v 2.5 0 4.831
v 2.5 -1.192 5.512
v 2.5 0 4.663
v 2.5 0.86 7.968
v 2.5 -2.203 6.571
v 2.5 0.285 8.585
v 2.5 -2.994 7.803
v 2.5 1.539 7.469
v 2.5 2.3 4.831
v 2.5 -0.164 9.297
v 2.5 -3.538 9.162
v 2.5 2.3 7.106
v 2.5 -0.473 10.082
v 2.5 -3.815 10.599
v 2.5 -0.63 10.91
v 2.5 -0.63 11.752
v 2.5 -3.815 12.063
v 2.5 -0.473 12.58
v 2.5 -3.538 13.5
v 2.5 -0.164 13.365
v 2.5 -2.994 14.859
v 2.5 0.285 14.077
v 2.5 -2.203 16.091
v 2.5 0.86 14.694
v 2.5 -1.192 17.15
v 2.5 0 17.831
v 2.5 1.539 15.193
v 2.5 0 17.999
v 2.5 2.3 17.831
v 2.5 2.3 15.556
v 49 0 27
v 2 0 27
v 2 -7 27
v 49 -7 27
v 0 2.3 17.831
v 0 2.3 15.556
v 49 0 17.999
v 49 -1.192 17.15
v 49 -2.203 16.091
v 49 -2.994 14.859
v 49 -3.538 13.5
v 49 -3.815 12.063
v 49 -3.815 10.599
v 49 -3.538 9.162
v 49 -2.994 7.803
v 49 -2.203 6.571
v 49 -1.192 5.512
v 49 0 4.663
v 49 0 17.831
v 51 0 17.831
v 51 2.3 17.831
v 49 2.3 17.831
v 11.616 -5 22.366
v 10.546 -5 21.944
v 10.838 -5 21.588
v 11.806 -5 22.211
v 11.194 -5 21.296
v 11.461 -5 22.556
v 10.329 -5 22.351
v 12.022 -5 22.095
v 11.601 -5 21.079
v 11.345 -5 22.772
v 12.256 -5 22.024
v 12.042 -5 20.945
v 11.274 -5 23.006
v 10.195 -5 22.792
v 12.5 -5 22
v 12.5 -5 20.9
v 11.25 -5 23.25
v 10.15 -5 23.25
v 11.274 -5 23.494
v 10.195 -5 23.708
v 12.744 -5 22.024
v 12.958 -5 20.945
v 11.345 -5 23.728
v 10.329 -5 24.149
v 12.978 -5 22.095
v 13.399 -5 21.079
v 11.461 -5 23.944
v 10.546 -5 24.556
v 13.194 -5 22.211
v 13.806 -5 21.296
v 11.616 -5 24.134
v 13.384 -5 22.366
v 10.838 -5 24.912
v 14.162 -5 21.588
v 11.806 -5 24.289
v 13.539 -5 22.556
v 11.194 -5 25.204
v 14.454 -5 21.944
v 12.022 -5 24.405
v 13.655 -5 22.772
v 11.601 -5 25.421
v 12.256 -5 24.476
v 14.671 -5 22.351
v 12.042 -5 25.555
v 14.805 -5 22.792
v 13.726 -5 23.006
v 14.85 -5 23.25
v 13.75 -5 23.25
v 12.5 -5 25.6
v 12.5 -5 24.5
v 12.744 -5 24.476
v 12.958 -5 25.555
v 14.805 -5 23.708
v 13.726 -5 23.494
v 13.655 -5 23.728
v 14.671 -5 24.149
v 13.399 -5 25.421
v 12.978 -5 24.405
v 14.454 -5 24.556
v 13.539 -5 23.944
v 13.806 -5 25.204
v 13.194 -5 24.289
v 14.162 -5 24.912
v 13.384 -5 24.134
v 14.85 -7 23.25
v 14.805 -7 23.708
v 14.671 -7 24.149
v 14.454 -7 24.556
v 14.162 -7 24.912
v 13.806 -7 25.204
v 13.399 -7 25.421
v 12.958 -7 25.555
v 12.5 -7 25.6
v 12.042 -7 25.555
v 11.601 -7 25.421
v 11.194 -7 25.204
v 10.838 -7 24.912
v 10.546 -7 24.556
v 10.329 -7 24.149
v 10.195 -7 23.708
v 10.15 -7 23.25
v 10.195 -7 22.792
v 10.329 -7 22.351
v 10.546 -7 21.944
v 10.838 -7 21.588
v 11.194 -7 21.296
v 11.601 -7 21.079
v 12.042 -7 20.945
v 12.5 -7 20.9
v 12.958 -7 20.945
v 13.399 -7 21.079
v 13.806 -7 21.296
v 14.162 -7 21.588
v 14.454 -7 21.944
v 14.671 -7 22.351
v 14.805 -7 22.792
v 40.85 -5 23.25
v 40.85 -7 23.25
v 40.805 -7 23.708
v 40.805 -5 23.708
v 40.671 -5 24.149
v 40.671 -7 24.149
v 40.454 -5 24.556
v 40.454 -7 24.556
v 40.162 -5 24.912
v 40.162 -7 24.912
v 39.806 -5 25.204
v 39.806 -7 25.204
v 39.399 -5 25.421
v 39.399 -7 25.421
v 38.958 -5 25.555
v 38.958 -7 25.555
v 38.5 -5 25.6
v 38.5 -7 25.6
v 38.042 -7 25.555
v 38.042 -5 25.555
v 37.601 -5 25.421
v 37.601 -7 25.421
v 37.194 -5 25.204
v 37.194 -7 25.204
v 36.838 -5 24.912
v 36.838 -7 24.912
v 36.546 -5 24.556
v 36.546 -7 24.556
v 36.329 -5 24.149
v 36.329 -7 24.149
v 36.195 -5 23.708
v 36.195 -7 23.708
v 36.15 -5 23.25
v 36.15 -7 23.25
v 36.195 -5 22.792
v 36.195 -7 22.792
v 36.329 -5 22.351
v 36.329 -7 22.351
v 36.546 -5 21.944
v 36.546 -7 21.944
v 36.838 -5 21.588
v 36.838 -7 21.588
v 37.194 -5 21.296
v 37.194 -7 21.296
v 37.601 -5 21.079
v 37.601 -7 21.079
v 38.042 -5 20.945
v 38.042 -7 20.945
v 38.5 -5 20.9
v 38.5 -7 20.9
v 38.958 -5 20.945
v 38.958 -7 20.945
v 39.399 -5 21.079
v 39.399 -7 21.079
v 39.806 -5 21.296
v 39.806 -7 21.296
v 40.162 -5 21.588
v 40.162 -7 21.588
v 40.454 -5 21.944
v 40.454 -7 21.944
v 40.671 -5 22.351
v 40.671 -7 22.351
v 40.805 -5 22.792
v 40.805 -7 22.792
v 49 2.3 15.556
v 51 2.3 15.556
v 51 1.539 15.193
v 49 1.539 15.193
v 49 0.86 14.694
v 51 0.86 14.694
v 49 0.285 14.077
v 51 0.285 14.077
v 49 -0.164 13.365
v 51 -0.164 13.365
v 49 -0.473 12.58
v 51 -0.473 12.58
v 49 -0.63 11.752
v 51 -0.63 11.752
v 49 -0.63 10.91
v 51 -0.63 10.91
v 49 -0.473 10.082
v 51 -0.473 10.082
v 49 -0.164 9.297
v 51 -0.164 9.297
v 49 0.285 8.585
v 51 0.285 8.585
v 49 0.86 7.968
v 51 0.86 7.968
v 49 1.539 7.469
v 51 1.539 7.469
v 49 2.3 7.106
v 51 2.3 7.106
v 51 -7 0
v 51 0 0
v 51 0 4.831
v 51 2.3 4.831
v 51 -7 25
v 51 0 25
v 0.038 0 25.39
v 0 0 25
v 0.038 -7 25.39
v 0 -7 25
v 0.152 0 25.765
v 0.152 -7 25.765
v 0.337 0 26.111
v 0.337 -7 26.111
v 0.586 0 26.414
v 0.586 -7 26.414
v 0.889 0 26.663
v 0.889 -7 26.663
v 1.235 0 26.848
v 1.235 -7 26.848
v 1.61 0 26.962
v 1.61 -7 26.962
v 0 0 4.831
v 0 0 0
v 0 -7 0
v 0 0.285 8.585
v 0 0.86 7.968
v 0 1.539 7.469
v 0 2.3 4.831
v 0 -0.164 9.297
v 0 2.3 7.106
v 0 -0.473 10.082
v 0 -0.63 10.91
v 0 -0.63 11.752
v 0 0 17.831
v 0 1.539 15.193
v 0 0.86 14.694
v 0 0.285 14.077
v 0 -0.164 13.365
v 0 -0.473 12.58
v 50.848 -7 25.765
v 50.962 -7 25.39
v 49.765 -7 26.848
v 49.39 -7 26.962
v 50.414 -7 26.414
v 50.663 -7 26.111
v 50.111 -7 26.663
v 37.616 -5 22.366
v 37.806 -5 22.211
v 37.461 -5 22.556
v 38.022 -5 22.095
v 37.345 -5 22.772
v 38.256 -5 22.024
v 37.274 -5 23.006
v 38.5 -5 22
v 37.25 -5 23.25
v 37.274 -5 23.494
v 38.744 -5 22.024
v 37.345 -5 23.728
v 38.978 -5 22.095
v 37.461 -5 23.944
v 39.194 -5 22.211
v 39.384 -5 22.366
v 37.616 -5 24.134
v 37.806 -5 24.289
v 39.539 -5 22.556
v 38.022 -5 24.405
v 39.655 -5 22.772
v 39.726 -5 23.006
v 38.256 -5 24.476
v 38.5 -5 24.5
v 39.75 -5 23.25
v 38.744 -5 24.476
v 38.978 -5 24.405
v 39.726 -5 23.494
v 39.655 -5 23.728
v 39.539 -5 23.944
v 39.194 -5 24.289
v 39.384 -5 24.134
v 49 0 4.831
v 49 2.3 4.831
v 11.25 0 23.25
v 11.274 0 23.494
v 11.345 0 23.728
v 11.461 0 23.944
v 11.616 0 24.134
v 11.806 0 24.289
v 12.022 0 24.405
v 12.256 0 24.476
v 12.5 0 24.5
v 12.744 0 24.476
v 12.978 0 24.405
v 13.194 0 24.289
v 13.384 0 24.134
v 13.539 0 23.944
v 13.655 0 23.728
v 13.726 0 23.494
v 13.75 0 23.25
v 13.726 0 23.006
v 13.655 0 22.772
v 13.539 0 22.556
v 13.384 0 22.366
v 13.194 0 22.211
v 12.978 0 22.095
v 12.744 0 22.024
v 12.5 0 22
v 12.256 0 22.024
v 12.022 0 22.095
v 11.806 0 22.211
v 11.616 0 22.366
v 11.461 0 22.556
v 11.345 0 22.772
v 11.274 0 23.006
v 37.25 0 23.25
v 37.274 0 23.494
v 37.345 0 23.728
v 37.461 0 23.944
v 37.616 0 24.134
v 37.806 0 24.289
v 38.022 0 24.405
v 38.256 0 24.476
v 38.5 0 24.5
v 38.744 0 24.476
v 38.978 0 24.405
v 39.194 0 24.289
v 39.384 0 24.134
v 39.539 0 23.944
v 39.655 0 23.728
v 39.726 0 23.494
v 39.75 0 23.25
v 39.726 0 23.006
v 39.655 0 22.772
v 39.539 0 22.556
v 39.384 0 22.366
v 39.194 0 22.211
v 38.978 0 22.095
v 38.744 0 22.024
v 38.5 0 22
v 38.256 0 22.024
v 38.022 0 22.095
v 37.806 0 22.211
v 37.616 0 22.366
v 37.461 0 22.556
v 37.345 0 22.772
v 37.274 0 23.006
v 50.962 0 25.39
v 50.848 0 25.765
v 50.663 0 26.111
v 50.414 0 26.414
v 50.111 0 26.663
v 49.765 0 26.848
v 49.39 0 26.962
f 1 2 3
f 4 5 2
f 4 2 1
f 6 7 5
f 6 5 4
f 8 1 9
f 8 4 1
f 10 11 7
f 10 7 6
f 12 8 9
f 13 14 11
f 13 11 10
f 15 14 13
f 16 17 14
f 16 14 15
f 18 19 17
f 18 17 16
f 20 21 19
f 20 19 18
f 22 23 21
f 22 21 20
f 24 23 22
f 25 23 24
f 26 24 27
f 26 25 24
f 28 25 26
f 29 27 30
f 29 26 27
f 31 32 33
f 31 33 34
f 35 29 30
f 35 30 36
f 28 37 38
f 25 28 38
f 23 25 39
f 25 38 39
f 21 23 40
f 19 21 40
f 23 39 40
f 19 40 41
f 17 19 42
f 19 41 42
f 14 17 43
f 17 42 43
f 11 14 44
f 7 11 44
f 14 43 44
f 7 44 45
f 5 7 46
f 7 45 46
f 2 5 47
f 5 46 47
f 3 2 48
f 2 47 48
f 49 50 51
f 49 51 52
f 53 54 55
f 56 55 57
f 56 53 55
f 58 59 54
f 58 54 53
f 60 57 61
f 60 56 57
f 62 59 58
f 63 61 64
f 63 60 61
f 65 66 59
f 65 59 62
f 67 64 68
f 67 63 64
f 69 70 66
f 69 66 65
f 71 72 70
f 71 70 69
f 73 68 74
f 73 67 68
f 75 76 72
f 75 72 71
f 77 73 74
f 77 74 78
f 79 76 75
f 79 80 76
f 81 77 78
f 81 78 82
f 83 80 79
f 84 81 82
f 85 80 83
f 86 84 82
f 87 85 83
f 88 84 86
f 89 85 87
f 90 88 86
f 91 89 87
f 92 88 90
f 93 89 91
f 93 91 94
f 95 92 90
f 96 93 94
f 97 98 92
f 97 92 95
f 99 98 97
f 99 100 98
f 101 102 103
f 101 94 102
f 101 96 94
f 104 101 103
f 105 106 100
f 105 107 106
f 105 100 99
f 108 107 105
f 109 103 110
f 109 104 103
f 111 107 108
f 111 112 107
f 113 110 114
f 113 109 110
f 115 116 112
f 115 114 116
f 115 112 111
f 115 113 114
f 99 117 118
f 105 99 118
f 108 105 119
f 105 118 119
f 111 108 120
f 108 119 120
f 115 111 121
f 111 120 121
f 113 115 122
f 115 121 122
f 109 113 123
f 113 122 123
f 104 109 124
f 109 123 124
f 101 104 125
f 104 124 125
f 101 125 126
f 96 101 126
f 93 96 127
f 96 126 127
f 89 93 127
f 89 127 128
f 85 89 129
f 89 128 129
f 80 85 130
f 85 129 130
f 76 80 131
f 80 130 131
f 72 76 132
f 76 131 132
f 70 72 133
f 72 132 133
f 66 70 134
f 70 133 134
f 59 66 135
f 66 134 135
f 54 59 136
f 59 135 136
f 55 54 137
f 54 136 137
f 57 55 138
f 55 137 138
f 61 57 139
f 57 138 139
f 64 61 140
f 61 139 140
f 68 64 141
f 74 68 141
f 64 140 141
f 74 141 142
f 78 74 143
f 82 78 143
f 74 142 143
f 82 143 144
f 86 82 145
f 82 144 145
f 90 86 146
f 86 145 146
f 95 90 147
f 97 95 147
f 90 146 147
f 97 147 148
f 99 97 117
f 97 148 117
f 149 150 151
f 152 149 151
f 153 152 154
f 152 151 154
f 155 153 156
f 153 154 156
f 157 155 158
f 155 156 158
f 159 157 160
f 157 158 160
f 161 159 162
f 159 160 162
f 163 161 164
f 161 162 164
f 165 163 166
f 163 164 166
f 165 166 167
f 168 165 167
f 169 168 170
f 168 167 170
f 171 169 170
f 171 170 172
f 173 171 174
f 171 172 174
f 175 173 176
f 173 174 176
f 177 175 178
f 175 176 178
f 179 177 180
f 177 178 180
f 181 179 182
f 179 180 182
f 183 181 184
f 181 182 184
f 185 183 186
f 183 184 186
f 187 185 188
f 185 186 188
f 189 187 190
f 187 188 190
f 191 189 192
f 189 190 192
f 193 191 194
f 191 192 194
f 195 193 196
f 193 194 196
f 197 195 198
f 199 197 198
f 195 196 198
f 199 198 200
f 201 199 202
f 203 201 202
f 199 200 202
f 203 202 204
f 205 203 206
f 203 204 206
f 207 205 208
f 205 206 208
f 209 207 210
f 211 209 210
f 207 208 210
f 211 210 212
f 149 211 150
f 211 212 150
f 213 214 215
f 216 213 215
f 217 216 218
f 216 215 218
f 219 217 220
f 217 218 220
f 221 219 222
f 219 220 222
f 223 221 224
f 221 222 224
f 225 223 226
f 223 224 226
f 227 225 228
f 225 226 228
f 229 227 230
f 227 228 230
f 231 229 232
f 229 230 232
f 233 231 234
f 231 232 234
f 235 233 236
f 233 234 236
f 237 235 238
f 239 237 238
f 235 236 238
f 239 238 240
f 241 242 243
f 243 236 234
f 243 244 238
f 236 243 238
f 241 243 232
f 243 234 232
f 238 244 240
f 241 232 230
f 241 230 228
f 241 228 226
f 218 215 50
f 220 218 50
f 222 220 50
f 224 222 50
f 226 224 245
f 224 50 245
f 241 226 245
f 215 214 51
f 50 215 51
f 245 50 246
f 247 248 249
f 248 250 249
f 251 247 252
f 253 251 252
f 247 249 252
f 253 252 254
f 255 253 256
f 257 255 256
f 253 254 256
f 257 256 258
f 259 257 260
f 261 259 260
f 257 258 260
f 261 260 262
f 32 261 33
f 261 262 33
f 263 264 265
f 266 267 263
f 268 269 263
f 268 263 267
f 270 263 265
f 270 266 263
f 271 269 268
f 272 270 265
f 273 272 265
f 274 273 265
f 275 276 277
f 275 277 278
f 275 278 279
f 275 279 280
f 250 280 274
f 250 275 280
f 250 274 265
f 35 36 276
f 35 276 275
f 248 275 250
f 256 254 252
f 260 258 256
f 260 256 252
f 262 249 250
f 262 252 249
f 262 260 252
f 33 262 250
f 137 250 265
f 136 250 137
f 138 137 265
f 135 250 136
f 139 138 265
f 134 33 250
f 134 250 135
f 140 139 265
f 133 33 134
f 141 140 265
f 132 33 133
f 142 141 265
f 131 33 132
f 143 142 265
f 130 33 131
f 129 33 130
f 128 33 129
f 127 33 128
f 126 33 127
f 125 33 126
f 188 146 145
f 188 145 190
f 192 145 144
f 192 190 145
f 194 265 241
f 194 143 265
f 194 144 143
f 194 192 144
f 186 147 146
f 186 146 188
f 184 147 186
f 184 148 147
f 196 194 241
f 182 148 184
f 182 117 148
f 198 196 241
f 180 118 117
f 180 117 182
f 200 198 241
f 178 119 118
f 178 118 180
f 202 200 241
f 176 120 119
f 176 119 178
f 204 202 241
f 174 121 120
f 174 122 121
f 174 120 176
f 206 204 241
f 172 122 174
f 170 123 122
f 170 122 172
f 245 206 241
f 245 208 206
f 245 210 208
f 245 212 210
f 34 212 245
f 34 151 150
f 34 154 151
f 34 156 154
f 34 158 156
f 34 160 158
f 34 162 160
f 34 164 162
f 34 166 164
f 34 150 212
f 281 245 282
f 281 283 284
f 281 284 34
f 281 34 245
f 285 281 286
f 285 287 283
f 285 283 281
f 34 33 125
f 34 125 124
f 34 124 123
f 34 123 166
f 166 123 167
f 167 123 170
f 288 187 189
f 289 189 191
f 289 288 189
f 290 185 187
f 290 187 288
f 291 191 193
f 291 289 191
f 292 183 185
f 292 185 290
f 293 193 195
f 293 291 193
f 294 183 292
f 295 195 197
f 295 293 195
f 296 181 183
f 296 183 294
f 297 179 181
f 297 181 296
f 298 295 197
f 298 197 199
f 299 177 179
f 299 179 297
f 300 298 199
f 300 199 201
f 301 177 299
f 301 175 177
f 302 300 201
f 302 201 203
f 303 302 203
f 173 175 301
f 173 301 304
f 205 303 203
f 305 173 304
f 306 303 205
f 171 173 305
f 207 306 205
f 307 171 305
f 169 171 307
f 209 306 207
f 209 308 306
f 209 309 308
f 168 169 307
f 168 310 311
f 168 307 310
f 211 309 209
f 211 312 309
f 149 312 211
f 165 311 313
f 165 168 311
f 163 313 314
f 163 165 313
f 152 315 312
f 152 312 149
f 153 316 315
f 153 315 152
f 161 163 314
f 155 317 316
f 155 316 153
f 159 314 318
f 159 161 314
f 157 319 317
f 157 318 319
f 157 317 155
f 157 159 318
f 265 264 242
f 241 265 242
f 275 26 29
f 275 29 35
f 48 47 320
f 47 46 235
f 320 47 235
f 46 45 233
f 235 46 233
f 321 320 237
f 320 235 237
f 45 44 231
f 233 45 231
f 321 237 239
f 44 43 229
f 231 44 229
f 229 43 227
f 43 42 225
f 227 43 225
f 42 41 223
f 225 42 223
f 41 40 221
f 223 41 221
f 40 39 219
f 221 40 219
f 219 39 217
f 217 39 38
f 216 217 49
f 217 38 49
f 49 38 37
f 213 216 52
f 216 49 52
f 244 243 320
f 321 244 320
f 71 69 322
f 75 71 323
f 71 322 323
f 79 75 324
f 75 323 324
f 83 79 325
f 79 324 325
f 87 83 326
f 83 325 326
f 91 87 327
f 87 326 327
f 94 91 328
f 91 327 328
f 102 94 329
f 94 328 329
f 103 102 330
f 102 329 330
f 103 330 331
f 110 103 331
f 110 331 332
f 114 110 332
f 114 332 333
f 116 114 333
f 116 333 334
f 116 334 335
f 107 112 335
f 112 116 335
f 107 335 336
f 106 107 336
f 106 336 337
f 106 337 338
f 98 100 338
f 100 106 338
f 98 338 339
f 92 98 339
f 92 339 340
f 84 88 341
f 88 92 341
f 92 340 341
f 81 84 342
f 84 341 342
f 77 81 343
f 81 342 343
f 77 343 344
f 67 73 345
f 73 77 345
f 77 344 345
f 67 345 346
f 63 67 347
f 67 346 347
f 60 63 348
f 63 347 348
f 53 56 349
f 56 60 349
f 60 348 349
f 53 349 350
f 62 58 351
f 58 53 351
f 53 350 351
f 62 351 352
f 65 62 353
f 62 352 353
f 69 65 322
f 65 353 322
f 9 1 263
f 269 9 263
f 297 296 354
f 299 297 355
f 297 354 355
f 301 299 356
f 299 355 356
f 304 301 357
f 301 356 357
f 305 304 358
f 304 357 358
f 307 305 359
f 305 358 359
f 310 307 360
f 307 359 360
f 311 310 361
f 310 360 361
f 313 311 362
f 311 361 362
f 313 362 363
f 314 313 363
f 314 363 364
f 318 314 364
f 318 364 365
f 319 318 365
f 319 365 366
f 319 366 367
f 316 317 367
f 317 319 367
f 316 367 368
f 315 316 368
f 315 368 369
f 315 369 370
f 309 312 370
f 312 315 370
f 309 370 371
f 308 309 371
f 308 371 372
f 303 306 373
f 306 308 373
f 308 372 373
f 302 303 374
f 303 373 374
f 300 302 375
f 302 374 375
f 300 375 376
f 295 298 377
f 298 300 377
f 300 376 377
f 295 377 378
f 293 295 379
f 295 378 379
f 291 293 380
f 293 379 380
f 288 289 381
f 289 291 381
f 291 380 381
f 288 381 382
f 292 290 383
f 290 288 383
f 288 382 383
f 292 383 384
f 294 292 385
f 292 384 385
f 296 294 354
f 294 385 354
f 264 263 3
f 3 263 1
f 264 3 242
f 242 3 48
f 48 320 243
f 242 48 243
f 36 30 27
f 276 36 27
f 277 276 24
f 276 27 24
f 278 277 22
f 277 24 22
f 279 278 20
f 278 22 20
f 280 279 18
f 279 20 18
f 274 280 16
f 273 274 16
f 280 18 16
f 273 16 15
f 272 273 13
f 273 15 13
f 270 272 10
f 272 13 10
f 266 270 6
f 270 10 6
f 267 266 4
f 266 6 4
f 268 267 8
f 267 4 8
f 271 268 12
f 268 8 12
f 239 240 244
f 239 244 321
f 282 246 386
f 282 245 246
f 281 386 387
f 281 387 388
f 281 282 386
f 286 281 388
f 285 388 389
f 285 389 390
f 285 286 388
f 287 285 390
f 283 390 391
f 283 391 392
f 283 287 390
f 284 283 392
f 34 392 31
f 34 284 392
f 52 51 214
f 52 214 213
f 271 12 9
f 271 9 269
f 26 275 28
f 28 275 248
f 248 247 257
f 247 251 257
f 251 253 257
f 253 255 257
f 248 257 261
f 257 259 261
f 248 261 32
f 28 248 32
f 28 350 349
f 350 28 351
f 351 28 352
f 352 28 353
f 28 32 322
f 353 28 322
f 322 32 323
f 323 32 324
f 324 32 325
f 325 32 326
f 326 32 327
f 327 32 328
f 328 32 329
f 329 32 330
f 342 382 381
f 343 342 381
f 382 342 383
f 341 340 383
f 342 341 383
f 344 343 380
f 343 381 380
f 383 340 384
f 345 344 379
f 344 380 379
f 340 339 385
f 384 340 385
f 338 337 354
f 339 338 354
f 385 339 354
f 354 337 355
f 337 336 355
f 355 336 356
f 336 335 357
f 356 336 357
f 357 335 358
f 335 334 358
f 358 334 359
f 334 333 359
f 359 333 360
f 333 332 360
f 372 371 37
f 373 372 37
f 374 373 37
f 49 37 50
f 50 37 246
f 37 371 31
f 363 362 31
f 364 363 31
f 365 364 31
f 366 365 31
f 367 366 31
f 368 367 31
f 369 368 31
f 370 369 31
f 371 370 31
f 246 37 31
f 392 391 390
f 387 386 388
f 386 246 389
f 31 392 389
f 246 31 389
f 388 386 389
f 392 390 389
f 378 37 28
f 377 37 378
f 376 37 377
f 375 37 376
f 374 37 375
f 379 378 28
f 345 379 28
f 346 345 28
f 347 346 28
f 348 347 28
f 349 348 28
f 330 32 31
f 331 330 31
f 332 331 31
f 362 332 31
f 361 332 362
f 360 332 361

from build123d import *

# Parameters (mm, degrees)
F0_W      = 51
F0_H      = 27
F1_DEPTH  = 7
F2_W      = 2.5
F2_H      = 13
F3_DEPTH  = 2.3
F5_DEPTH  = 51
F7_R      = 7.7
F8_DEPTH  = 46.5
F9_R      = 1.25
F10_DEPTH = 25
F11_R     = 2.35
F11_R_2   = 1.25
F12_DEPTH = 2
F13_R     = 2


with BuildPart() as f1:
    # F0 (on Front) → F1 (new body)
    with BuildSketch(Plane.XZ):
        with Locations((25.5, 13.5)):
            Rectangle(F0_W, F0_H)
    extrude(amount=F1_DEPTH)

    # F2 (on face) → F3 (join)
    with BuildSketch(Plane(origin=(0, 0, 0), x_dir=(-1, 0, 0), z_dir=(0, 1, 0))):
        with Locations((-49.75, 11.331)):
            Rectangle(F2_W, F2_H)
        with Locations((-1.25, 11.331)):
            Rectangle(F2_W, F2_H)
    extrude(amount=F3_DEPTH)

    # F4 (on face) → F5 (cut, through all)
    with BuildSketch(Plane.YZ.offset(51)):
        with BuildLine():
            Line((2.3, 7.1063698387), (2.3, 15.5556301613))
            ThreePointArc((2.3, 15.5556301613), (-0.65, 11.331), (2.3, 7.1063698387))
        make_face()
        with BuildLine():
            ThreePointArc((2.3, 7.1063698387), (6.4263346056, 7.6414878371), (8.35, 11.331))
            ThreePointArc((8.35, 11.331), (6.4263346056, 15.0205121629), (2.3, 15.5556301613))
            Line((2.3, 15.5556301613), (2.3, 7.1063698387))
        make_face()
    extrude(amount=-F5_DEPTH, mode=Mode.SUBTRACT)

    # F7 (on offset) → F8 (cut, through all)
    with BuildSketch(Plane.YZ.offset(49)):
        with Locations((3.85, 11.331)):
            Circle(F7_R)
    extrude(amount=-F8_DEPTH, mode=Mode.SUBTRACT)

    # F9 (on face) → F10 (cut)
    with BuildSketch(Plane(origin=(0, 0, 0), x_dir=(-1, 0, 0), z_dir=(0, 1, 0))):
        with Locations((-38.5, 23.25)):
            Circle(F9_R)
        with Locations((-12.5, 23.25)):
            Circle(F9_R)
    extrude(amount=-F10_DEPTH, mode=Mode.SUBTRACT)

    # F11 (on face) → F12 (cut)
    with BuildSketch(Plane.XZ.offset(7)):
        with Locations((12.5, 23.25)):
            Circle(F11_R)
        with Locations((12.5, 23.25)):
            Circle(F11_R_2, mode=Mode.SUBTRACT)
        with Locations((38.5, 23.25)):
            Circle(F11_R)
        with Locations((38.5, 23.25)):
            Circle(F11_R_2, mode=Mode.SUBTRACT)
    extrude(amount=-F12_DEPTH, mode=Mode.SUBTRACT)

    # F13
    f13_edges = [f1.edges().sort_by_distance(p)[0] for p in [
        (0, -3.5, 27),
        (51, -3.5, 27),
    ]]
    fillet(f13_edges, radius=F13_R)


solid = f1.part
